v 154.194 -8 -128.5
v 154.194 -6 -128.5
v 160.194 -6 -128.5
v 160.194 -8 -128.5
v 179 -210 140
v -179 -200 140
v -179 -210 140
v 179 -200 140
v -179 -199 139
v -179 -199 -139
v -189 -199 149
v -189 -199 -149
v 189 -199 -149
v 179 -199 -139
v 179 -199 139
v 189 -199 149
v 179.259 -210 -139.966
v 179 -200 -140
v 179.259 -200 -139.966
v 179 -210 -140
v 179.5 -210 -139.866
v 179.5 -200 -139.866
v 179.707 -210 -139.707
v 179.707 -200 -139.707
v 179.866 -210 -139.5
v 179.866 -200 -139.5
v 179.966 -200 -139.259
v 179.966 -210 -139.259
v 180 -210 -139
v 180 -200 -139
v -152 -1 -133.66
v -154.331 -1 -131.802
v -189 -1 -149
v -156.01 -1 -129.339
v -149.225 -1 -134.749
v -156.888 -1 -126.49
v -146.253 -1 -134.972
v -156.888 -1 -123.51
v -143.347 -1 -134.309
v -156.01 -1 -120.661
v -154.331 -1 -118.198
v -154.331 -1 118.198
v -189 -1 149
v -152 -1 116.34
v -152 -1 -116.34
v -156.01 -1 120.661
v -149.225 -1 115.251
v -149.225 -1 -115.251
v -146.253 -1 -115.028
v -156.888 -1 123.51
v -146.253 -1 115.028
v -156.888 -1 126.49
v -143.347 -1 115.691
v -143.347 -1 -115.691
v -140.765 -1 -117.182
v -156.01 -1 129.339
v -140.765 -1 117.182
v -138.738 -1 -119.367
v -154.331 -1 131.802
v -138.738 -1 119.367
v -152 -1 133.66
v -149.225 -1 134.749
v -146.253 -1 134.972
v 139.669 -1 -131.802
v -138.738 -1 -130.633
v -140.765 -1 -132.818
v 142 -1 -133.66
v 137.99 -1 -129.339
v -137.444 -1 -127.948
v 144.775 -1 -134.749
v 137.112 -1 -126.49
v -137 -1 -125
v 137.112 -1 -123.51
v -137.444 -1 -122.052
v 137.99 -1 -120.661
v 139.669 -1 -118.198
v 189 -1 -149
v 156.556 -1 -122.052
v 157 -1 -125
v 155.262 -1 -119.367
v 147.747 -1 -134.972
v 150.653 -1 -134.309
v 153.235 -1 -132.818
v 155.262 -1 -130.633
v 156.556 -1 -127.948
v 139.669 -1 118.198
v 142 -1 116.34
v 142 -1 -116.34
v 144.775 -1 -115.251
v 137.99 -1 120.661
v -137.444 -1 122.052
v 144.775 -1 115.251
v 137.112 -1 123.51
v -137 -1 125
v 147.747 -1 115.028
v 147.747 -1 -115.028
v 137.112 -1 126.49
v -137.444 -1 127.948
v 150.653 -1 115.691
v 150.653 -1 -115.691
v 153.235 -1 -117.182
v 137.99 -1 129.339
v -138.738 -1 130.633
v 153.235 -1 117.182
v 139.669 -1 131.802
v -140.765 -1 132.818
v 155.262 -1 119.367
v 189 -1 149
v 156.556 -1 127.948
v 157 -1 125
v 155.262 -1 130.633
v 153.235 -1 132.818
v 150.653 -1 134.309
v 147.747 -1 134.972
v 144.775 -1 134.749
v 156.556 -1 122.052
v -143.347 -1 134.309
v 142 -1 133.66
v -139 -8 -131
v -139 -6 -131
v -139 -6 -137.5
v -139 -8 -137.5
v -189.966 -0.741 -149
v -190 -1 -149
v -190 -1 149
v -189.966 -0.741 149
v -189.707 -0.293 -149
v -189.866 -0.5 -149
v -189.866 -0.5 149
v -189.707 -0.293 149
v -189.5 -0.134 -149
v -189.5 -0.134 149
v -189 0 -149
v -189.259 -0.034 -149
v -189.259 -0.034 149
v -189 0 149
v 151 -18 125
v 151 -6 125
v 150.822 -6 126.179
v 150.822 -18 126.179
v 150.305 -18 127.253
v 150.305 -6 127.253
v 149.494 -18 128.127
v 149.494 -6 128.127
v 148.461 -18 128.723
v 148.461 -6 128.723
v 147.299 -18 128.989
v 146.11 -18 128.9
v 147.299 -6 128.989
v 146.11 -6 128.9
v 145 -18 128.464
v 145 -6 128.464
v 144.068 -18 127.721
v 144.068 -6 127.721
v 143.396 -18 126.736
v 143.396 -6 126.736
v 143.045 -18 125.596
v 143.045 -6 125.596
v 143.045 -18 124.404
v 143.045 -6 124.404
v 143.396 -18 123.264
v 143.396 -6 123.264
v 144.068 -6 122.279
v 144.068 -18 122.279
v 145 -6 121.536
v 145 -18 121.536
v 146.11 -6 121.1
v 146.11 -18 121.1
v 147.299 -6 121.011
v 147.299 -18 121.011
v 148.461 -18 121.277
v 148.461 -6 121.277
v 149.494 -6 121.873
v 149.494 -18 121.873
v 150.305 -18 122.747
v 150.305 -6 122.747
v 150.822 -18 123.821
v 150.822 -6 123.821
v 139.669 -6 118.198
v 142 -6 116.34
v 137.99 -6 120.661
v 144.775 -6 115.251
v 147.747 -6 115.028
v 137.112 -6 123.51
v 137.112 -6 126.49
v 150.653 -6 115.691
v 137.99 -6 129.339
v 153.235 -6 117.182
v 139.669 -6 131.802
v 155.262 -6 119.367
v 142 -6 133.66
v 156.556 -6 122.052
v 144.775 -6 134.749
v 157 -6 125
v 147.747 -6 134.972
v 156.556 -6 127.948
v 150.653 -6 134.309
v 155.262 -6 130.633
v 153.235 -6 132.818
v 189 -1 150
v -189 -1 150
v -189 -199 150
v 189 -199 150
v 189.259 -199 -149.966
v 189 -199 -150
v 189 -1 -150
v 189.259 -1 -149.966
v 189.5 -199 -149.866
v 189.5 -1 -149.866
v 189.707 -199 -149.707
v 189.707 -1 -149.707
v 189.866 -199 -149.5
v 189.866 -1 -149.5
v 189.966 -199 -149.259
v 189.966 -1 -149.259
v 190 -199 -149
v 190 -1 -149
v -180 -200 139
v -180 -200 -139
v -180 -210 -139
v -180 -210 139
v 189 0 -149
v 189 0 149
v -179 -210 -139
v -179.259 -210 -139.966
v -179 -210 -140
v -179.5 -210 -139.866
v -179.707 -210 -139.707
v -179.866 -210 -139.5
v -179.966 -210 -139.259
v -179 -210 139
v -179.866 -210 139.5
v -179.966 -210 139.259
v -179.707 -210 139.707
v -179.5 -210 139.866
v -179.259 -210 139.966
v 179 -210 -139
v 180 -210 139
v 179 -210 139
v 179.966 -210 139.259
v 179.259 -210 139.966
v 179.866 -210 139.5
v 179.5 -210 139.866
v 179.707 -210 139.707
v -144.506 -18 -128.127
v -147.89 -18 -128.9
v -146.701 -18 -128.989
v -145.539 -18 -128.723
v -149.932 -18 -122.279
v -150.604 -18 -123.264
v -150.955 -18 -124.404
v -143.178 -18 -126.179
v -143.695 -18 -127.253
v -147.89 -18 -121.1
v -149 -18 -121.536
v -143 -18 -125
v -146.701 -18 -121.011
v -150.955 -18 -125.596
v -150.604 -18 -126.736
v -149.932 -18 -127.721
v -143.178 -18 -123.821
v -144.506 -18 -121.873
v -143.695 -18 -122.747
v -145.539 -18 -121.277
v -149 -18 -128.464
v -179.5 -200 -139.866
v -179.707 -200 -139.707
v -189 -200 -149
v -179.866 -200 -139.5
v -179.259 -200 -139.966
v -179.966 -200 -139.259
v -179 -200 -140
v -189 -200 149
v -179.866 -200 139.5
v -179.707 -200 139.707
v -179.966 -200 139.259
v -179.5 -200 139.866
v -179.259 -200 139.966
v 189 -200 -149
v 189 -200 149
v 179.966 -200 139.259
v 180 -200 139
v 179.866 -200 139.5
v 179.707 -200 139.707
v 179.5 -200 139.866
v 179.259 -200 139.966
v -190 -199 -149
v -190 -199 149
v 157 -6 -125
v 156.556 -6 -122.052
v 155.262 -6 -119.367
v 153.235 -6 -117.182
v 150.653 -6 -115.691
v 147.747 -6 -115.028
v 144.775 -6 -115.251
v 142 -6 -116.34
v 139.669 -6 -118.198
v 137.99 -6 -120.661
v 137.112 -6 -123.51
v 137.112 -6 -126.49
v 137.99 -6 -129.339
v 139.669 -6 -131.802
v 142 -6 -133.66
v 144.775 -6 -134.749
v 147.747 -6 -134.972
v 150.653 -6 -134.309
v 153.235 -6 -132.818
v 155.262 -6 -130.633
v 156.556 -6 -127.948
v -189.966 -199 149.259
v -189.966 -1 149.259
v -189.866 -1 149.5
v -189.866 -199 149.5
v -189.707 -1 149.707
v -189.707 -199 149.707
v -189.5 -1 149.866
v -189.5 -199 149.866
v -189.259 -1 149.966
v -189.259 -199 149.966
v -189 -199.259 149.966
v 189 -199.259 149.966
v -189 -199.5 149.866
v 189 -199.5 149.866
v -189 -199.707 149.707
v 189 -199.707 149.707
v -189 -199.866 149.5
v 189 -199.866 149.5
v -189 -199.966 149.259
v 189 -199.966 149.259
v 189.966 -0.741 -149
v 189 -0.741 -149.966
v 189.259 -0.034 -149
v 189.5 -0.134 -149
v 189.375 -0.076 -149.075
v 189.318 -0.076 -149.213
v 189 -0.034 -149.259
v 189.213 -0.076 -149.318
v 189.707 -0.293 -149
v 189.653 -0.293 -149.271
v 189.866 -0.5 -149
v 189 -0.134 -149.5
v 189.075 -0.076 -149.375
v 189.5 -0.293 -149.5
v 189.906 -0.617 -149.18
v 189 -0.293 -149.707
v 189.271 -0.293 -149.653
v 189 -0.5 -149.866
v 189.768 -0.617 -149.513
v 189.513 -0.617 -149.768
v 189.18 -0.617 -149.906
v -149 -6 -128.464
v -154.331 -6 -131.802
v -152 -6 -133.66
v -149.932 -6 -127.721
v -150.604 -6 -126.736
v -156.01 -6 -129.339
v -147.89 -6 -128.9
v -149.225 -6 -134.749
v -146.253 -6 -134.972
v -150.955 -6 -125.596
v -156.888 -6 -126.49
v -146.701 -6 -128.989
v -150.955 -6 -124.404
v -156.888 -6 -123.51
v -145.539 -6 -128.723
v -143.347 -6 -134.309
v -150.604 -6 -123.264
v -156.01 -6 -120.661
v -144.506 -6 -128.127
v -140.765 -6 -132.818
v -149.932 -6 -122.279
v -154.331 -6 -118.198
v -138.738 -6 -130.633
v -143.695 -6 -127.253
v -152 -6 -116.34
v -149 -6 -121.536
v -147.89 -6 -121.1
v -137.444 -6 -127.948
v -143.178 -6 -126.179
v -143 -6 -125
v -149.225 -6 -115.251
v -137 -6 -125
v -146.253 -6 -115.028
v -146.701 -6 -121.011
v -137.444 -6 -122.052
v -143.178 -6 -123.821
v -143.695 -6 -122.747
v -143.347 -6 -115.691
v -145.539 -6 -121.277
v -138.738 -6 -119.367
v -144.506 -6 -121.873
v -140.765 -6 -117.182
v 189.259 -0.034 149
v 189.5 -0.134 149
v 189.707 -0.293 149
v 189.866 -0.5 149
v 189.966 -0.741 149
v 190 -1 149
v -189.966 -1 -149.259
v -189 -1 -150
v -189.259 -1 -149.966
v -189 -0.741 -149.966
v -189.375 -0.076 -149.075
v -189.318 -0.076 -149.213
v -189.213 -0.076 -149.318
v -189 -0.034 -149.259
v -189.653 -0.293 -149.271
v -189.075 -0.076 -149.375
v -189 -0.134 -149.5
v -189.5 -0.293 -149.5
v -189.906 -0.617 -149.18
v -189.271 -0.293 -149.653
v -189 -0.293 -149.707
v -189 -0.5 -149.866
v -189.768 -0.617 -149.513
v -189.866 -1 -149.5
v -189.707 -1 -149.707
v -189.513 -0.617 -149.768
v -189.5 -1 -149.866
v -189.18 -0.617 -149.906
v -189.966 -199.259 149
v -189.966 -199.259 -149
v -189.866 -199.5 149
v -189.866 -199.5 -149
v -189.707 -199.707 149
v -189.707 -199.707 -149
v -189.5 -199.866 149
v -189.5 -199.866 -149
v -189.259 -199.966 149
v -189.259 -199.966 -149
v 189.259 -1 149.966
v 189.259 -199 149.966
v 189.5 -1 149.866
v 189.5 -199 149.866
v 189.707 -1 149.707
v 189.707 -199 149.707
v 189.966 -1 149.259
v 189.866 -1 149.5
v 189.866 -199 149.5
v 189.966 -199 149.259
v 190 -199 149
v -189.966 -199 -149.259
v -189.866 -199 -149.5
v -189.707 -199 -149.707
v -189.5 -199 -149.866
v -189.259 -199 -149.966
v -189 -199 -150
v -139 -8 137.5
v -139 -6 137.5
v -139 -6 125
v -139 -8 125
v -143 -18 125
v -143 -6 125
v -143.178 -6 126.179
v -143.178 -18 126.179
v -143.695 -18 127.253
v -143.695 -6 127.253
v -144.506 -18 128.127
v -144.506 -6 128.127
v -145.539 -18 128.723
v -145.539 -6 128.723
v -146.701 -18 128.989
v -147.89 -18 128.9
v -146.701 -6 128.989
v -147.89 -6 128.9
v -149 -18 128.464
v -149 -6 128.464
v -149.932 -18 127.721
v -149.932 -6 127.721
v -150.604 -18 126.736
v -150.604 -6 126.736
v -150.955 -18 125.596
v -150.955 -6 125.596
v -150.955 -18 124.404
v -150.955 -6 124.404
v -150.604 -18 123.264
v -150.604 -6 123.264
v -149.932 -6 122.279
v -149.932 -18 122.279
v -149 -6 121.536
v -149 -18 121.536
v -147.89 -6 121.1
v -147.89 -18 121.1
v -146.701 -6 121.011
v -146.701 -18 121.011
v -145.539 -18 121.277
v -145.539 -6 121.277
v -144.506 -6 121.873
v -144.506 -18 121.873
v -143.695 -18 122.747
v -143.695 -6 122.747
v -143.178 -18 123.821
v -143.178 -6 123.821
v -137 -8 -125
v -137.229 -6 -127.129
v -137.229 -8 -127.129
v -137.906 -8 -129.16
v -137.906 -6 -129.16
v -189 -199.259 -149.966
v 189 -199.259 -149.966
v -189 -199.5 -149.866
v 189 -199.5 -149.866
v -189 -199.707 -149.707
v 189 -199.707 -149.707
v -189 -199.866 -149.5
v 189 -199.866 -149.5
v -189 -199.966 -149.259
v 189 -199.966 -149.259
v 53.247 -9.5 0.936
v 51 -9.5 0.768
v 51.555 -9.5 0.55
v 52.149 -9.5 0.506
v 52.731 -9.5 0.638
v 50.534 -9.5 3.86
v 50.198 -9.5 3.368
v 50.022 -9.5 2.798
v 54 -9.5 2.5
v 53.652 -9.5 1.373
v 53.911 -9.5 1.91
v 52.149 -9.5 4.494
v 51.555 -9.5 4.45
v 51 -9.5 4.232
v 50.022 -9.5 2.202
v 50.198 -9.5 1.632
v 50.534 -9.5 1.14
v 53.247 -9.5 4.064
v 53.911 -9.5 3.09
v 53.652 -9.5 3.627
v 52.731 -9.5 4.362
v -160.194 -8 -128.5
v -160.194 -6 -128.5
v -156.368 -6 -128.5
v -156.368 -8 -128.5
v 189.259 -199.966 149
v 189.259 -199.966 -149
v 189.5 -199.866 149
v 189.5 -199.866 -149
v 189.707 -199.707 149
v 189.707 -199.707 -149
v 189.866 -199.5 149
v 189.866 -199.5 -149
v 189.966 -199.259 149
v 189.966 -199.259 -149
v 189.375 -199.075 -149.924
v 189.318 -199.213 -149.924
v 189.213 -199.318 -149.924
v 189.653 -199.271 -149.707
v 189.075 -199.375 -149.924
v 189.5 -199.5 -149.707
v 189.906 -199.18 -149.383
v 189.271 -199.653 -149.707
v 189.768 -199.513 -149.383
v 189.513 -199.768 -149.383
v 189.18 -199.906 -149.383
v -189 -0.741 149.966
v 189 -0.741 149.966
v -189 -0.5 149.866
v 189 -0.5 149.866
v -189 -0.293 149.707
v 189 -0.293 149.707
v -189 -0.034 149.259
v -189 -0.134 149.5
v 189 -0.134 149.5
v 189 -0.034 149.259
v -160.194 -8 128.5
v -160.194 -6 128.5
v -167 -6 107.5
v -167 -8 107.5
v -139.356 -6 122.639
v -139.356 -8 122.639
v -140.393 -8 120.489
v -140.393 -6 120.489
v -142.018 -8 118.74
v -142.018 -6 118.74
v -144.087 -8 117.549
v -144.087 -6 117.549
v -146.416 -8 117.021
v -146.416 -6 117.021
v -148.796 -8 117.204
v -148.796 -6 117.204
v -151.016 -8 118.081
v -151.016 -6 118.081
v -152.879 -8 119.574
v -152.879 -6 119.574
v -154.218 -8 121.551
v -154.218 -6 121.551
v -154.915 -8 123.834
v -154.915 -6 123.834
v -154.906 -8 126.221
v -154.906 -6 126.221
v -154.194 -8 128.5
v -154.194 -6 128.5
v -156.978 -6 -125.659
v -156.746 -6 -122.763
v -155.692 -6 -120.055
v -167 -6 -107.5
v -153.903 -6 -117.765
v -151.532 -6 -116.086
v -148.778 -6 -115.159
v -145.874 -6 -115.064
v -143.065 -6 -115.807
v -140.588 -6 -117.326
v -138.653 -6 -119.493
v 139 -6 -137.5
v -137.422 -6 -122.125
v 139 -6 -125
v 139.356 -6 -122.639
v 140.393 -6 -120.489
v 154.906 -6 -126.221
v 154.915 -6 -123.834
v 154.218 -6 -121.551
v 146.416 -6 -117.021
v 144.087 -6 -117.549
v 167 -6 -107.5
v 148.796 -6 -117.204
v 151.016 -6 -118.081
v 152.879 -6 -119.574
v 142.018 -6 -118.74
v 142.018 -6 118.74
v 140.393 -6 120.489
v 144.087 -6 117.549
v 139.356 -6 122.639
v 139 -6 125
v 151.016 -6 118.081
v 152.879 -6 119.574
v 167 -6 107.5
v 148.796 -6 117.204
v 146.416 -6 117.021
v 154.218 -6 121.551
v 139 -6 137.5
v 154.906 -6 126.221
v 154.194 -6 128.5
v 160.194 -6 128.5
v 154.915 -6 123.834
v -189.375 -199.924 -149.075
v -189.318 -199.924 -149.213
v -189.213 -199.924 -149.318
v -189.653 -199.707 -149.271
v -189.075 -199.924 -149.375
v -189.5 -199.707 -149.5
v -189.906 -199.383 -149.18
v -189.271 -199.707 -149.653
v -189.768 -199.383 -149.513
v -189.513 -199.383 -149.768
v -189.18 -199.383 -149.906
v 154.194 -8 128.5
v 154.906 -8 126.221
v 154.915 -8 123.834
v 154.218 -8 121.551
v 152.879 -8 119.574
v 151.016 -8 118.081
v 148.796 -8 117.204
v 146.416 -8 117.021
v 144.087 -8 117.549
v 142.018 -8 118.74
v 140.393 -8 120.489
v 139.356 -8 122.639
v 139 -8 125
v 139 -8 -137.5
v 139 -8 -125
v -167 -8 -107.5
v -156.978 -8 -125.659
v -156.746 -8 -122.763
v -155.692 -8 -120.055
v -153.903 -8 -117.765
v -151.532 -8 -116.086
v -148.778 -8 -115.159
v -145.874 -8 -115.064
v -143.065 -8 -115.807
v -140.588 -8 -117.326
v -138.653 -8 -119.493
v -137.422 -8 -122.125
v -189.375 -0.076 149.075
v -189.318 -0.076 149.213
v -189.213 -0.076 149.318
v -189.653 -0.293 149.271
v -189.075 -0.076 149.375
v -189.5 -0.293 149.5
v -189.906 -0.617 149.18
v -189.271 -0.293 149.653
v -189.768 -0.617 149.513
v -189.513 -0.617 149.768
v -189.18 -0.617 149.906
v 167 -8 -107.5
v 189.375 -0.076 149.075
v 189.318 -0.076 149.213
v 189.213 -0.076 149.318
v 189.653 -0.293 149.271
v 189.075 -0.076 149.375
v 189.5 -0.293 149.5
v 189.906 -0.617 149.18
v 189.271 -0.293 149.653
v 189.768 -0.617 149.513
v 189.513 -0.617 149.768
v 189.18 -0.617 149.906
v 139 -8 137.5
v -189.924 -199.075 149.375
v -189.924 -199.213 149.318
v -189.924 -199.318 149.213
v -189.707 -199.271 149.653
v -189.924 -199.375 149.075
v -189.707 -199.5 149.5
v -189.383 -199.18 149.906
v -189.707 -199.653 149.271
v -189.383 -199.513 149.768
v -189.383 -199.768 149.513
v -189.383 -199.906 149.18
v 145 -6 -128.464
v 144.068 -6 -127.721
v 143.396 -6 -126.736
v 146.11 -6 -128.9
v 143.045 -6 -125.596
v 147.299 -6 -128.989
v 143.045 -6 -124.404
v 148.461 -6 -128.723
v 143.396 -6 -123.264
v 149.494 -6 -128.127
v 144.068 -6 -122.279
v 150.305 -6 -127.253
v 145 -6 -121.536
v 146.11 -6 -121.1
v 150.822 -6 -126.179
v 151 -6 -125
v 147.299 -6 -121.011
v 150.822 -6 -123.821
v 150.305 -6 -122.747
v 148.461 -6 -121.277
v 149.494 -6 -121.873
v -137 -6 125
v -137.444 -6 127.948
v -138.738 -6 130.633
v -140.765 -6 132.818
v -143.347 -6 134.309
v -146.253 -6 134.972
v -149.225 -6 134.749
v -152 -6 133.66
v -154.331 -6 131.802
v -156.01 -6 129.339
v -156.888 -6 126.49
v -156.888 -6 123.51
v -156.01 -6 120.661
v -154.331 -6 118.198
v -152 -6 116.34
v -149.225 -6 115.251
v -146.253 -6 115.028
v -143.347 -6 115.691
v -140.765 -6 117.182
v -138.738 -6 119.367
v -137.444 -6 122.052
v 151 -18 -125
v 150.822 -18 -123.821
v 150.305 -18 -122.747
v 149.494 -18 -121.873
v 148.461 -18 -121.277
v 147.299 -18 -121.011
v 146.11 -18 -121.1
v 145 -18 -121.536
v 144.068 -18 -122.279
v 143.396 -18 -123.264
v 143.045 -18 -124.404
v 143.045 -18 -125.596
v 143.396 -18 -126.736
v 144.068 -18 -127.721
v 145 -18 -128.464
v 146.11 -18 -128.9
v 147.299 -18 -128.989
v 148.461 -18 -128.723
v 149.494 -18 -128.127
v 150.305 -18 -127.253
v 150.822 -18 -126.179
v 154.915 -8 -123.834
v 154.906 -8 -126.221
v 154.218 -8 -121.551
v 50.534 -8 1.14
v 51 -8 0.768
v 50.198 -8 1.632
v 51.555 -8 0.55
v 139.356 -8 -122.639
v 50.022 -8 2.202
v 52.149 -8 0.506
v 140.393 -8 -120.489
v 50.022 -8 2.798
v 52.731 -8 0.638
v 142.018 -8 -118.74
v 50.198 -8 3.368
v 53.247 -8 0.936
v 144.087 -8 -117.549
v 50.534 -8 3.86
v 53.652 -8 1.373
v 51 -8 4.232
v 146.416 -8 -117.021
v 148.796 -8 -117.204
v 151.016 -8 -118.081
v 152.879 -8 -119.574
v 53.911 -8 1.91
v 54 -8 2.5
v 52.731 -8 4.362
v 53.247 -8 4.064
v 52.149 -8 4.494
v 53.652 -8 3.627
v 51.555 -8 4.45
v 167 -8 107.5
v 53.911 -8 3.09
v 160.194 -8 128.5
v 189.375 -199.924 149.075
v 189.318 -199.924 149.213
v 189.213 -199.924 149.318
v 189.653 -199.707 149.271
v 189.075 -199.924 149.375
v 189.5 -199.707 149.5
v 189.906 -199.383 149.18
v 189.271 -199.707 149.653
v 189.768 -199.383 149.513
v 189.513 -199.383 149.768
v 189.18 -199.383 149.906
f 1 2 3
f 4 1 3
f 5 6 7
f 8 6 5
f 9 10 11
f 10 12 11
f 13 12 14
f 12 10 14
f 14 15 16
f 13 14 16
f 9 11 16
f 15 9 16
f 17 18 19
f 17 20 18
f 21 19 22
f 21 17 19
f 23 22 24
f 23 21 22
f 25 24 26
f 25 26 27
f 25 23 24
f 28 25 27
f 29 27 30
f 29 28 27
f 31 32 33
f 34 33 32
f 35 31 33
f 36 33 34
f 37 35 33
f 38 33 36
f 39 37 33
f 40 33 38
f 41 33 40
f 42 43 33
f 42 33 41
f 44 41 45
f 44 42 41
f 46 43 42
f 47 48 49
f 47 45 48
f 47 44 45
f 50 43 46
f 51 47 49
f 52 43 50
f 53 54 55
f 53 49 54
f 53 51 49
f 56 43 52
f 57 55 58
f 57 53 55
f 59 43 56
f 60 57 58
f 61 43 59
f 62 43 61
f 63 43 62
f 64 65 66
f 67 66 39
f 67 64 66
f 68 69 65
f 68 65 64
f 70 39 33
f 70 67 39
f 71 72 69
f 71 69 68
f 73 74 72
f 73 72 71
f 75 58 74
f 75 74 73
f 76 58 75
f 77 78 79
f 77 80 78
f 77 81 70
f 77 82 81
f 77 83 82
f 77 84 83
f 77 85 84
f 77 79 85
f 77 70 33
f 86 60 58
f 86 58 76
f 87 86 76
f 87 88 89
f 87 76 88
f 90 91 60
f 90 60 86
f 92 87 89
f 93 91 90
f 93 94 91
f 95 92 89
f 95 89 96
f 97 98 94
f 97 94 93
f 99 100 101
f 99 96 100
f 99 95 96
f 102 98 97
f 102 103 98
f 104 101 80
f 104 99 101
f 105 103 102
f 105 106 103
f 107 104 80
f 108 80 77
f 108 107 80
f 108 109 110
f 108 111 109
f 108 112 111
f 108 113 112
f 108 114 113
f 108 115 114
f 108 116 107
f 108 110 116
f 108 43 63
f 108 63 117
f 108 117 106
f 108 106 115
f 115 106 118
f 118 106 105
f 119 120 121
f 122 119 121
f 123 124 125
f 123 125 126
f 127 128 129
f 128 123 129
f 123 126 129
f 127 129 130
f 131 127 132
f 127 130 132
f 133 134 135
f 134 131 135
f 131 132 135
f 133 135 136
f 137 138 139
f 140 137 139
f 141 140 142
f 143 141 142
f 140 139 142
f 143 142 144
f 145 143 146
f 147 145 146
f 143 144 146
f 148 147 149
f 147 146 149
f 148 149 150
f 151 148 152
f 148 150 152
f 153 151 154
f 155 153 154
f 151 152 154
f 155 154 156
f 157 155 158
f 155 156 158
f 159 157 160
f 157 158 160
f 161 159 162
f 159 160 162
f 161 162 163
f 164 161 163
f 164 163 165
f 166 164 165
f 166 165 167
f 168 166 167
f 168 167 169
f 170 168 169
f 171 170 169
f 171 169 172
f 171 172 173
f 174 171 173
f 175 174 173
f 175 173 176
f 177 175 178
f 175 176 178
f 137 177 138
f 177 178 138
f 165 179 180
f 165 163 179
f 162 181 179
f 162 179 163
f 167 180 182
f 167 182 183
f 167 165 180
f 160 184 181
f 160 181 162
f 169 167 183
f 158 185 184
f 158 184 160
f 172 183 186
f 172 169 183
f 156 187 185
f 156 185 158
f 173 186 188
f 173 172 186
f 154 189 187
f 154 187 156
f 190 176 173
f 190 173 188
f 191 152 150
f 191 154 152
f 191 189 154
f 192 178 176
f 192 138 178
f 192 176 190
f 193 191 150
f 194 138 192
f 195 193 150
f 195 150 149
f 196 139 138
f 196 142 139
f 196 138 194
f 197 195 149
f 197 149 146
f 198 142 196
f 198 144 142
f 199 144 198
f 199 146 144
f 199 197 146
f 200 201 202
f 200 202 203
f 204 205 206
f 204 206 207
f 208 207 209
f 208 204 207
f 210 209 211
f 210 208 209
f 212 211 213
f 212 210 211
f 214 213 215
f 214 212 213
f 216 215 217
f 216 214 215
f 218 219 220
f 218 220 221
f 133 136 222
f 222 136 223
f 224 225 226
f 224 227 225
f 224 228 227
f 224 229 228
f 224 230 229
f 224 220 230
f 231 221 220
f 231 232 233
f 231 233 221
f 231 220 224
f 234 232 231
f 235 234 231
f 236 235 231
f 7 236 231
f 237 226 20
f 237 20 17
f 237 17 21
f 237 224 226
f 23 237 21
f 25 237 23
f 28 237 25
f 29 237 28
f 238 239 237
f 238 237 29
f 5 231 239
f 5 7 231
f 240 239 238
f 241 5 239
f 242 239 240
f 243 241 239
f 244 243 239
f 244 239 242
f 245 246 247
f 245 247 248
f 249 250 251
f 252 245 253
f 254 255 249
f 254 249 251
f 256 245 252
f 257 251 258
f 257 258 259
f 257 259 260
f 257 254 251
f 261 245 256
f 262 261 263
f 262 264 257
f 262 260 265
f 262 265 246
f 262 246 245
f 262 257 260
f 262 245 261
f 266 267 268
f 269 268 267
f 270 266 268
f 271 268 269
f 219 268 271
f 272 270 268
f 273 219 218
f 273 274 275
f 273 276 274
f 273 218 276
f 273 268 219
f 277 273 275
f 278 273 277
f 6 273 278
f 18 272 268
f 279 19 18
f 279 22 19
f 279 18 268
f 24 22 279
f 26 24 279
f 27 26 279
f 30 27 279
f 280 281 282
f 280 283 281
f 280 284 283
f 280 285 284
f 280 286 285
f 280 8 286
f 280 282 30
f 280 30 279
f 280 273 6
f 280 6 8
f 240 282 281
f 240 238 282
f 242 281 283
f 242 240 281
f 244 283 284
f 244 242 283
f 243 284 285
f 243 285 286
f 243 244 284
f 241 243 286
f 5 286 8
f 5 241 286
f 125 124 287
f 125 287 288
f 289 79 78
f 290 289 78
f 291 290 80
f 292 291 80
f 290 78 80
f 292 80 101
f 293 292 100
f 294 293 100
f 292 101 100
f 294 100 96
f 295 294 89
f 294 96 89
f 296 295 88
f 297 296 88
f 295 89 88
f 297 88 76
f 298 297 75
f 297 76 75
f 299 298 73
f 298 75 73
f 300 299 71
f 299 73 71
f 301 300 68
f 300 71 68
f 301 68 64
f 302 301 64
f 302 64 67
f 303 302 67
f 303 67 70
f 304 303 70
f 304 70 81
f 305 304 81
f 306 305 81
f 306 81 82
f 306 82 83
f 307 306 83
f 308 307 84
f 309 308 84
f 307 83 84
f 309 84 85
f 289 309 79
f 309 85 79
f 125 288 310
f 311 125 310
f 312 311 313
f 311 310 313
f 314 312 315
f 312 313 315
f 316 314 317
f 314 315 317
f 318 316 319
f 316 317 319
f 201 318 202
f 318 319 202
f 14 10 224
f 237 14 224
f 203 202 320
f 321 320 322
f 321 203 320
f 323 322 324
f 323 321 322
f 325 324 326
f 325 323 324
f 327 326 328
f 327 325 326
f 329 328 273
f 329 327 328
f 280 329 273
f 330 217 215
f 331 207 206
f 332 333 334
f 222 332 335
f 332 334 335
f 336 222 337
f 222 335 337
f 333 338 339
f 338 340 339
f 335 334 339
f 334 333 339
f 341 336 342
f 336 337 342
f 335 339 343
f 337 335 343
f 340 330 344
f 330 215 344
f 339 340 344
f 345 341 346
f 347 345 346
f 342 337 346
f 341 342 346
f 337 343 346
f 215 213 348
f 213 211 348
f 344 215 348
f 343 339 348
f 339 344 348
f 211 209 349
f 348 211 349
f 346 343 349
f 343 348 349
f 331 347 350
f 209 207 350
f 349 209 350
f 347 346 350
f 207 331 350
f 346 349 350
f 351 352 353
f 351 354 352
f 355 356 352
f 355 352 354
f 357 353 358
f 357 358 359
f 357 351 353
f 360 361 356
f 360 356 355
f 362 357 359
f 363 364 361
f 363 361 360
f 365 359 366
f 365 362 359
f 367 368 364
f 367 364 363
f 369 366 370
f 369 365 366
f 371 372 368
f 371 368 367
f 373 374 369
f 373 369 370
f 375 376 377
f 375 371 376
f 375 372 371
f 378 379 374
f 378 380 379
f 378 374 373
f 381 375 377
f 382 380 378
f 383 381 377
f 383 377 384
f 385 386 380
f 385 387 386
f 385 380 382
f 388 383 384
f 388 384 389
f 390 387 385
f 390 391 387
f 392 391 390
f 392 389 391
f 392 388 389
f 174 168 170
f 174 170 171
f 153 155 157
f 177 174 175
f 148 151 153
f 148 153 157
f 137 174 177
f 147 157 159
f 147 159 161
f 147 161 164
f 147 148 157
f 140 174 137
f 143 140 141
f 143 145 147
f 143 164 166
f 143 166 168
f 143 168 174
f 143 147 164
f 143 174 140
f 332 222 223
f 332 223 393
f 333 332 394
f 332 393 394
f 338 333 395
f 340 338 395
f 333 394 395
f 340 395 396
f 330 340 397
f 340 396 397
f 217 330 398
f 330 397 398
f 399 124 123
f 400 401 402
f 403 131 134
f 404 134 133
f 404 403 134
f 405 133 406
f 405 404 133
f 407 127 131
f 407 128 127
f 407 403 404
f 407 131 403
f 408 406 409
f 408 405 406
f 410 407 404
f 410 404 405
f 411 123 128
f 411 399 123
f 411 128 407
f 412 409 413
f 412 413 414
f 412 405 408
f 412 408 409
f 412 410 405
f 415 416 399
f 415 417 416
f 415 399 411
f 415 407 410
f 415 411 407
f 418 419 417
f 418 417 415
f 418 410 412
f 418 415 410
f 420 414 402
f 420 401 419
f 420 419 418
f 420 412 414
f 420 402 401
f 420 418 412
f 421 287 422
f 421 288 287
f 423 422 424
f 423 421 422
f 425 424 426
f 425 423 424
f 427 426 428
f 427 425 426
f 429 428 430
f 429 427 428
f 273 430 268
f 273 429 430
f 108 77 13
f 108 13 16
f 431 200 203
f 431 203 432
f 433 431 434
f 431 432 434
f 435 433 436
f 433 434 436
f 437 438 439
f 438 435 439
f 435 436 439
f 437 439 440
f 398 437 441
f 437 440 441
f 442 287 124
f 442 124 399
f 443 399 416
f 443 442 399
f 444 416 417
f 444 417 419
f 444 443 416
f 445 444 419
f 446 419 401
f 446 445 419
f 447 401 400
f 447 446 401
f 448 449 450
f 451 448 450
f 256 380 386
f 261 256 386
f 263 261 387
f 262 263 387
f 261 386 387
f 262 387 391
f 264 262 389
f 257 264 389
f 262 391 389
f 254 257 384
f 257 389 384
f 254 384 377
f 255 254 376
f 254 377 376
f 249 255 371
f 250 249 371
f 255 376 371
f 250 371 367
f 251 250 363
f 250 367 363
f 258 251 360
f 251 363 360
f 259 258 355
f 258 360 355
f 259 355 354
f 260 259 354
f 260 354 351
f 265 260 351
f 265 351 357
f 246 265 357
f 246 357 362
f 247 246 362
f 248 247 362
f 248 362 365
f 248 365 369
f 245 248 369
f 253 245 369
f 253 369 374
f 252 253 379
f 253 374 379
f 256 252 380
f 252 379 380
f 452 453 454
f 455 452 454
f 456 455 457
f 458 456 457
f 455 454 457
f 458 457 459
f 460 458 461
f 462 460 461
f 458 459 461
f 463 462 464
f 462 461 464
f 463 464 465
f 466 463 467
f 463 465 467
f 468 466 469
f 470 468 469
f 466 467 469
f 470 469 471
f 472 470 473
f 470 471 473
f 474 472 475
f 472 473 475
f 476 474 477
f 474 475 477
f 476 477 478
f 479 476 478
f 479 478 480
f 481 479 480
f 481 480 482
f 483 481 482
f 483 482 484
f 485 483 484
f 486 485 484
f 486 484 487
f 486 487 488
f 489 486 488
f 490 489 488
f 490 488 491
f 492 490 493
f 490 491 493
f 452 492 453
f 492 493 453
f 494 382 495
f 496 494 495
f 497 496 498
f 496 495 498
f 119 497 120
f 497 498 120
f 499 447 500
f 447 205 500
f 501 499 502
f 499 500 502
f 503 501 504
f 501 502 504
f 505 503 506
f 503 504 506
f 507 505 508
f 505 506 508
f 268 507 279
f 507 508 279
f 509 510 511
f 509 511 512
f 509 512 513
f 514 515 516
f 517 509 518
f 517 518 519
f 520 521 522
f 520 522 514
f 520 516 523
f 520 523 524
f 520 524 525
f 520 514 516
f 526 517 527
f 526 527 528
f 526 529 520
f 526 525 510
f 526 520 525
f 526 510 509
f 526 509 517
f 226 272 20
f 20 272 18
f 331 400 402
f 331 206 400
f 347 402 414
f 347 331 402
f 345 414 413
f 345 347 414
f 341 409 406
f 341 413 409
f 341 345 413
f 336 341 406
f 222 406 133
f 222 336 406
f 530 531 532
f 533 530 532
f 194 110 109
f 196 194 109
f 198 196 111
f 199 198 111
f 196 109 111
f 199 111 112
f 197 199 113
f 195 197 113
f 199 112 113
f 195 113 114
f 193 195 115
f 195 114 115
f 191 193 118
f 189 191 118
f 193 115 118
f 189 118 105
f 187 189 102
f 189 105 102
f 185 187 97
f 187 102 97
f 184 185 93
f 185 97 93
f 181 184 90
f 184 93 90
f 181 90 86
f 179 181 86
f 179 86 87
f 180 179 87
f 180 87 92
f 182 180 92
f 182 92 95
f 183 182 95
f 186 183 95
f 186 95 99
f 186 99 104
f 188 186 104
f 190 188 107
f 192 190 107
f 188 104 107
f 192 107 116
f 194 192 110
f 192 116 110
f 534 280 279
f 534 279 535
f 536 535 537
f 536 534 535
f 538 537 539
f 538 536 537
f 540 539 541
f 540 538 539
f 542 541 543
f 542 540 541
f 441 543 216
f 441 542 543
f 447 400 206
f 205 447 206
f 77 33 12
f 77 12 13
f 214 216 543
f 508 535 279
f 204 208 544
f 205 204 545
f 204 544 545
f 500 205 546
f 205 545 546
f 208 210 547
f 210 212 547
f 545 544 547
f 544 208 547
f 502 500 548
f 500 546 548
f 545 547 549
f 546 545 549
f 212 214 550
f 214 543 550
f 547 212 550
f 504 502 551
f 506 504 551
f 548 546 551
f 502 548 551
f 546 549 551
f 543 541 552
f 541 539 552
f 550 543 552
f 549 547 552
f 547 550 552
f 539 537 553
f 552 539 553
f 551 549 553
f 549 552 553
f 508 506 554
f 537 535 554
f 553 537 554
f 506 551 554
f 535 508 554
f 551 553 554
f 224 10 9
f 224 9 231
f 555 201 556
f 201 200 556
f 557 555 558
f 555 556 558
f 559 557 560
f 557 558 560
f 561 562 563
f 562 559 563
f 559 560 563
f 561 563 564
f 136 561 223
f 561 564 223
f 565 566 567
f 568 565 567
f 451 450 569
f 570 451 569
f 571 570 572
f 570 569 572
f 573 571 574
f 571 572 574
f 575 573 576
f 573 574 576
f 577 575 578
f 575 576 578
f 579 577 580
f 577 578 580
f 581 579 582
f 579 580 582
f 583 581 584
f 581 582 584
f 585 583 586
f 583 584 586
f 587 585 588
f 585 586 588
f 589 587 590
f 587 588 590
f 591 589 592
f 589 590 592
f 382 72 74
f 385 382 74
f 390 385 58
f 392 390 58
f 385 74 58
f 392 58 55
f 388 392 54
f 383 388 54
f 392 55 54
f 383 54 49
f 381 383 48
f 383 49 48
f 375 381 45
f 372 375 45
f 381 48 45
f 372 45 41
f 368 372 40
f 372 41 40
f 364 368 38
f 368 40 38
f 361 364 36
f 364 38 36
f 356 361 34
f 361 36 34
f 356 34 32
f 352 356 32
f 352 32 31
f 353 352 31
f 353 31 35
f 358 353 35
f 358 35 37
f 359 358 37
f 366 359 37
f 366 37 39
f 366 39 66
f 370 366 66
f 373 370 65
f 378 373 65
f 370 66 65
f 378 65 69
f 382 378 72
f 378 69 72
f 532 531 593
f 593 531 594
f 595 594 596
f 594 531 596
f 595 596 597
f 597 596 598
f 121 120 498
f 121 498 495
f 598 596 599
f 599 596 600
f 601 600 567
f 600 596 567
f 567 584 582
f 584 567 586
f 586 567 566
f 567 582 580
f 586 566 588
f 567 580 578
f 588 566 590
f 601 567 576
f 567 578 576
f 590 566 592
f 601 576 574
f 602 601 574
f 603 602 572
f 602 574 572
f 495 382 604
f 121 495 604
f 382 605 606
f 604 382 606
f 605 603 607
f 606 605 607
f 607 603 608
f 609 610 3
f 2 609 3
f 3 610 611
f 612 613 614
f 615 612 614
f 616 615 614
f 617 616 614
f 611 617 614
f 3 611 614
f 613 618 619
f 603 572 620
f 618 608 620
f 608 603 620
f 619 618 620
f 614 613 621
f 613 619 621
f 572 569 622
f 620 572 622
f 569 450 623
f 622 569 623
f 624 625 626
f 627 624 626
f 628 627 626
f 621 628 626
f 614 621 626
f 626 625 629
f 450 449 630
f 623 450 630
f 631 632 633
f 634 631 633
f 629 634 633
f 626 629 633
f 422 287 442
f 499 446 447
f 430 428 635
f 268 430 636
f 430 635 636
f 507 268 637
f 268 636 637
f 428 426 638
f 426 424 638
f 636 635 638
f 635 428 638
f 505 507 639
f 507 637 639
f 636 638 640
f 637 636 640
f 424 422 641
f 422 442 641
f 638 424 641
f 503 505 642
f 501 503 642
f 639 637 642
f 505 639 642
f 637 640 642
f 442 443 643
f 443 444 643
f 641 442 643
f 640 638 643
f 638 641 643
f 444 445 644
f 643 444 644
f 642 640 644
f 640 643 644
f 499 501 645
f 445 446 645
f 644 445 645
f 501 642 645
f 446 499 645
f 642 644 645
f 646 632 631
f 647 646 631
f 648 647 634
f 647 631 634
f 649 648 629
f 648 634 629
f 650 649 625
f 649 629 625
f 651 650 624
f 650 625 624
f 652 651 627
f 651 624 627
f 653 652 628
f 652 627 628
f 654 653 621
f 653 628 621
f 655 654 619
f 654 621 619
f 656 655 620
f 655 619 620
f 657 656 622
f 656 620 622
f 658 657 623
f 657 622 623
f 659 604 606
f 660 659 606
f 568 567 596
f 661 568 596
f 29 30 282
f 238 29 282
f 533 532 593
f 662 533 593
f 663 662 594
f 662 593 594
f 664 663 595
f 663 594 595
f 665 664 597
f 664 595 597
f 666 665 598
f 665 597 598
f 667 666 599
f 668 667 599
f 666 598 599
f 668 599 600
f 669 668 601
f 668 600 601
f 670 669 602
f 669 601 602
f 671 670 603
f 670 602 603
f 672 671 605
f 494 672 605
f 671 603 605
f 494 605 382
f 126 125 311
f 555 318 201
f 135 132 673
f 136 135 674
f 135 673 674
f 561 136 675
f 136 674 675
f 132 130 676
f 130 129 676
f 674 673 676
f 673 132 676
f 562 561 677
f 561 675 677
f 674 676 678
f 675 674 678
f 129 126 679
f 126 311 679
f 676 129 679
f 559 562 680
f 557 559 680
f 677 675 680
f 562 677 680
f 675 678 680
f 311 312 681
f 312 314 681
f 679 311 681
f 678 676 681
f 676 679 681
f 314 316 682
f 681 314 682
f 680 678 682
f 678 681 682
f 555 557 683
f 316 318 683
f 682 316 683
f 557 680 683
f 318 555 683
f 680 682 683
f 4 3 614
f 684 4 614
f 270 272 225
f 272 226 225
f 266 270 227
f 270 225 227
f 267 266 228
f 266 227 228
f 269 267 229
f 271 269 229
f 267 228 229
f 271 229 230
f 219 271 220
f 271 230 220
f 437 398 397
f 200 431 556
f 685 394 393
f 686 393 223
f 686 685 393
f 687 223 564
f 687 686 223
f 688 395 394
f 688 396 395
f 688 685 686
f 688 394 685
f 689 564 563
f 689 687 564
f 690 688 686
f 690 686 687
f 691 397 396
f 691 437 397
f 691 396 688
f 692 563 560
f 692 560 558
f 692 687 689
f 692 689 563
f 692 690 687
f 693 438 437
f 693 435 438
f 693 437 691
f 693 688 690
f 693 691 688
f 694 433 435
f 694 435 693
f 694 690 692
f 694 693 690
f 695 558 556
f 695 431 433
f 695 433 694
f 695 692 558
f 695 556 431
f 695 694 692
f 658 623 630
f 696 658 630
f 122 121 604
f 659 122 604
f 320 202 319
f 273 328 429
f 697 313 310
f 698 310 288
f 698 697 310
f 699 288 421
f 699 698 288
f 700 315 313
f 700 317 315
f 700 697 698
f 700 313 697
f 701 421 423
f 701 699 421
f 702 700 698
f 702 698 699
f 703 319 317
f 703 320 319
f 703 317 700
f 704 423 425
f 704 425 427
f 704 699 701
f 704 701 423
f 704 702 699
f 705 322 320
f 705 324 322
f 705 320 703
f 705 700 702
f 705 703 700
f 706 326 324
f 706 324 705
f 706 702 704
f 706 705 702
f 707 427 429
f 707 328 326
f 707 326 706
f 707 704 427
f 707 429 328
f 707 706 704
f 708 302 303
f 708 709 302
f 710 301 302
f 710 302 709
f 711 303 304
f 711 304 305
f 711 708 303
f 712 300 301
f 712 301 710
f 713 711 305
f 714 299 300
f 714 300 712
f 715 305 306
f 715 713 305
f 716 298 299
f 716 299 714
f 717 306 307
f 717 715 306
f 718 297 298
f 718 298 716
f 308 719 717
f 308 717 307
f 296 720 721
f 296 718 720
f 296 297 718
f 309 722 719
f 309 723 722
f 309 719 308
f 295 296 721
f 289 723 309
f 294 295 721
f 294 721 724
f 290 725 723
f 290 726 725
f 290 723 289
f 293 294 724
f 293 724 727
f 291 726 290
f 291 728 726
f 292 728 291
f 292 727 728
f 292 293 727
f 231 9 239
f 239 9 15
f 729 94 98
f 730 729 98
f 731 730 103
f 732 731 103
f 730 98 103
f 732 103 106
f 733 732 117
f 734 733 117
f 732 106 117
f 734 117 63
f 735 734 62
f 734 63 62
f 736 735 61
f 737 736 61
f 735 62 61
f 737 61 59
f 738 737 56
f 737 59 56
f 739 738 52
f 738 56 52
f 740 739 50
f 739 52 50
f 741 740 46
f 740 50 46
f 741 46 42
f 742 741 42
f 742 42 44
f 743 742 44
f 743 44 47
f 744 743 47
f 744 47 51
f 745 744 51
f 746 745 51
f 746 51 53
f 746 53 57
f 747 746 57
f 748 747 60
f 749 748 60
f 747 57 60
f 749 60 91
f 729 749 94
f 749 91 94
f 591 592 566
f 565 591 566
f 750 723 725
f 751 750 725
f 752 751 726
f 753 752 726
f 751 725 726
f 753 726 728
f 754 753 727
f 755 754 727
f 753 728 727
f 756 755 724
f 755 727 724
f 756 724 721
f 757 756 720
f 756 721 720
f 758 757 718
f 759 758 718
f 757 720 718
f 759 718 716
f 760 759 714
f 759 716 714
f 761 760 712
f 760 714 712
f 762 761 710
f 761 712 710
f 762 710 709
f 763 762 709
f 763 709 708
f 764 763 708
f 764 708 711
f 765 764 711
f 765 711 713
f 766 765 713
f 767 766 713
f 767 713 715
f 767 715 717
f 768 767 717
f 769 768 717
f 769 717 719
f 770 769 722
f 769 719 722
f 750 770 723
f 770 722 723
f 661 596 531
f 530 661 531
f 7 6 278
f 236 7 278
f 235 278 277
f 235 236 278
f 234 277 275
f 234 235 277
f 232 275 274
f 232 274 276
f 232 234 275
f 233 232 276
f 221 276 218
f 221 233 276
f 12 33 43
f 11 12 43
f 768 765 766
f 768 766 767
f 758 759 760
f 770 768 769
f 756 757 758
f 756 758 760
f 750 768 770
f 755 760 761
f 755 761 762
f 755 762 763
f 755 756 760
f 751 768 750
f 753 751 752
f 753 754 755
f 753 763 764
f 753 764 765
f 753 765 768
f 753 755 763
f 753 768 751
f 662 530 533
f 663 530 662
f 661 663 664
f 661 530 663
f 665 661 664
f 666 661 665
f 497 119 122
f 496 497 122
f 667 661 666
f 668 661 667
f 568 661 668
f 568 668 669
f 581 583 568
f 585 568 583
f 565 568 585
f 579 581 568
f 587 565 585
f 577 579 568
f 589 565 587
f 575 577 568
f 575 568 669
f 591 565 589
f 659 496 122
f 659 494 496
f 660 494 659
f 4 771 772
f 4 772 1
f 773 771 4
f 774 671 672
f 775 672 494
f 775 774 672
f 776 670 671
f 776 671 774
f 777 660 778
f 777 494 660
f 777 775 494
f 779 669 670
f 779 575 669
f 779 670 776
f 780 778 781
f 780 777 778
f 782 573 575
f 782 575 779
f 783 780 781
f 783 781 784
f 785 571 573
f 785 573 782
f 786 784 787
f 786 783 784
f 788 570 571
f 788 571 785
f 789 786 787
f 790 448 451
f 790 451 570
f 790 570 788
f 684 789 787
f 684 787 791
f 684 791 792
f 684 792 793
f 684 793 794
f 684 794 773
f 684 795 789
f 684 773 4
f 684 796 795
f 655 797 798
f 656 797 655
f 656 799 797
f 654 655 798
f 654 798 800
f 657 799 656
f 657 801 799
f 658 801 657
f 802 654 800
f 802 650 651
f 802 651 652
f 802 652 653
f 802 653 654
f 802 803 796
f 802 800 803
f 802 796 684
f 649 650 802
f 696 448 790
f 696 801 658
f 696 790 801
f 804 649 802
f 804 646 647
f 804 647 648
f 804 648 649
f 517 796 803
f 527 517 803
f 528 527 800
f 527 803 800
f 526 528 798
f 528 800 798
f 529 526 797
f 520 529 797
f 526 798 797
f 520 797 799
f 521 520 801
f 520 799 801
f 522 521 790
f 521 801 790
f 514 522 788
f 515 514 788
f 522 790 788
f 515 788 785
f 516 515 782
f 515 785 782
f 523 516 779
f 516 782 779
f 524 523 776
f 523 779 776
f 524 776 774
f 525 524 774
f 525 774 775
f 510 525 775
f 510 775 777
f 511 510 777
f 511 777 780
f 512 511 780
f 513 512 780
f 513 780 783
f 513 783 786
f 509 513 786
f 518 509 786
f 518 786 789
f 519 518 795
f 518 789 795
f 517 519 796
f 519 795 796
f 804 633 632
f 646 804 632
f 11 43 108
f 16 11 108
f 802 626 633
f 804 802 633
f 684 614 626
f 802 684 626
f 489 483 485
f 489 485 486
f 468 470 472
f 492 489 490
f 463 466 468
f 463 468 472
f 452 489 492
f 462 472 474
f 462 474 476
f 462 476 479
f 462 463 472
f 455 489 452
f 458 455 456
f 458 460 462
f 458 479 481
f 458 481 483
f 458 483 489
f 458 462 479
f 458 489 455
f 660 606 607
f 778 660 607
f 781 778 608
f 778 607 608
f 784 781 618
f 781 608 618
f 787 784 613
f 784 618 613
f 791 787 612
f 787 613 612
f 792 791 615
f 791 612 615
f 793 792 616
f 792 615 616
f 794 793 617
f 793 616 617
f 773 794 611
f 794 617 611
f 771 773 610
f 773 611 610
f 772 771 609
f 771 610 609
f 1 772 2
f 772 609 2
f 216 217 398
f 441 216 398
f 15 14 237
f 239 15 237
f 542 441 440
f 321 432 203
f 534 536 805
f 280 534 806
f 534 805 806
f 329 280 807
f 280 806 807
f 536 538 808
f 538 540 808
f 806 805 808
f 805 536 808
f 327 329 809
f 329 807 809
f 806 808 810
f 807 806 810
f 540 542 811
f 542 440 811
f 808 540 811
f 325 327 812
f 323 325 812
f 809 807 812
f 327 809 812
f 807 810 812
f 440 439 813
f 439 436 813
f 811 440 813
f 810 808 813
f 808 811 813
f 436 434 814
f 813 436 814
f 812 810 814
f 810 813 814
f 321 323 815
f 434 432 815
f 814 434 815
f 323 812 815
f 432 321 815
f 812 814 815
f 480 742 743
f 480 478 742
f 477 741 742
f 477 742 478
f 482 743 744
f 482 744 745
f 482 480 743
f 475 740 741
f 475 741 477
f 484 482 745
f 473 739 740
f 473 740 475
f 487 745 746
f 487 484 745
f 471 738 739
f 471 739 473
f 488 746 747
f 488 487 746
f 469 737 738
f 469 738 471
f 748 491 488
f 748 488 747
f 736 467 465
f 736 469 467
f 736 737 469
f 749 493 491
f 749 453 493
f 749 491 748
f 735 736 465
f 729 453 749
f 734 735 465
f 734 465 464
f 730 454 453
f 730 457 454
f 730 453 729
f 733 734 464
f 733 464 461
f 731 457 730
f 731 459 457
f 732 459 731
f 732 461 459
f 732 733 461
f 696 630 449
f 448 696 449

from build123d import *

# Parameters (mm, degrees)
F0_W         = 380
F0_H         = 300
F1_DEPTH     = 200
F2_W         = 360
F2_H         = 280
F3_DEPTH     = 10
F4_R         = 1
F5_T         = 1
F5_T3_DEPTH  = 280
F5_T5_DEPTH  = 360
F5_T8_ANGLE  = 90.000000001
F5_T10_ANGLE = 90.000000001
F5_T12_ANGLE = 90.000000001
F5_T14_ANGLE = 90.000000001
F6_R         = 10
F6_R_2       = 4
F7_DEPTH     = 5
F8_R         = 4
F9_DEPTH     = 12
F11_DEPTH    = 2
F12_R        = 2
F13_DEPTH    = 1.5


# Not quite as in the source:
# - a shell that OpenCascade refuses in one call is made with other operations: the cavity is built on its own and cut out


with BuildPart() as f1:
    # F0 (on Front) → F1 (new body)
    with BuildSketch(Plane.XZ):
        Rectangle(F0_W, F0_H)
    extrude(amount=F1_DEPTH)

    # F2 (on face) → F3 (join)
    with BuildSketch(Plane.XZ.offset(200)):
        Rectangle(F2_W, F2_H)
    extrude(amount=F3_DEPTH)

    # F4
    f4_edges = [f1.edges().sort_by_distance(p)[0] for p in [
        (190, -100, 150),
        (190, -200, 0),
        (190, -100, -150),
        (190, 0, 0),
        (0, -200, 150),
        (-190, -100, 150),
        (-190, -100, -150),
        (-190, -200, 0),
        (-190, 0, 0),
        (0, 0, 150),
        (0, -200, -150),
        (0, 0, -150),
        (180, -205, 140),
        (-180, -205, 140),
        (180, -205, -140),
        (-180, -205, -140),
    ]]
    fillet(f4_edges, radius=F4_R)

    # F5: shell of thickness 1, made by hand


with BuildPart() as f5_core1:
    # F5_t2: copy of F1
    add(f1.part)

    # the walls: a layer under each face that stays
    f5_faces = [f5_core1.faces().sort_by_distance(p)[0] for p in [
        (190, -100, 0),
        (0, -100, 150),
        (0, 0, 0),
        (129.9375, -200, -145.3209876543),
        (0, -100, -150),
        (180, -205, 0),
        (0, -205, -140),
        (0, -205, 140),
        (-180, -205, 0),
        (-190, -100, 0),
    ]]
    thicken(f5_faces, amount=-F5_T, mode=Mode.SUBTRACT)

    # F5_s4 → F5_t3 (cut)
    with BuildSketch(Plane.XY.offset(-140)):
        Polygon((180.01, -200.01), (180, -199), (179, -199), (179, -200), align=None)
        Polygon((-180.01, -200.01), (-180, -199), (-179, -199), (-179, -200), align=None)
    extrude(amount=F5_T3_DEPTH, mode=Mode.SUBTRACT)

    # F5_s6 → F5_t5 (cut)
    with BuildSketch(Plane.YZ.offset(-180)):
        Polygon((-200.01, -140.01), (-199, -140), (-199, -139), (-200, -139), align=None)
        Polygon((-200.01, 140.01), (-199, 140), (-199, 139), (-200, 139), align=None)
    extrude(amount=F5_T5_DEPTH, mode=Mode.SUBTRACT)

    # F5_s7 → F5_t8 (revolve, cut)
    with BuildSketch(Plane.XY.offset(-139)):
        Polygon((180.01, -200.01), (180, -199), (179, -199), (179, -200), align=None)
    revolve(axis=Axis((179, -200, -139), (0, 1, 0)), revolution_arc=F5_T8_ANGLE, mode=Mode.SUBTRACT)

    # F5_s9 → F5_t10 (revolve, cut)
    with BuildSketch(Plane.XY.offset(139)):
        Polygon((180.01, -200.01), (180, -199), (179, -199), (179, -200), align=None)
    revolve(axis=Axis((179, -200, 139), (0, -1, 0)), revolution_arc=F5_T10_ANGLE, mode=Mode.SUBTRACT)

    # F5_s11 → F5_t12 (revolve, cut)
    with BuildSketch(Plane.XY.offset(-139)):
        Polygon((-180.01, -200.01), (-180, -199), (-179, -199), (-179, -200), align=None)
    revolve(axis=Axis((-179, -200, -139), (0, -1, 0)), revolution_arc=F5_T12_ANGLE, mode=Mode.SUBTRACT)

    # F5_s13 → F5_t14 (revolve, cut)
    with BuildSketch(Plane.YZ.offset(-179)):
        Polygon((-200.01, 140.01), (-199, 140), (-199, 139), (-200, 139), align=None)
    revolve(axis=Axis((-179, -200, 139), (0, -1, 0)), revolution_arc=F5_T14_ANGLE, mode=Mode.SUBTRACT)


with BuildPart() as f1_1:
    add(f1.part)

    # what is left inside the walls is the cavity
    f5_cavity = [f5_core1.part.solids().sort_by_distance(p)[0] for p in [
        (0, -1.01, -49.666667),
    ]]
    add(f5_cavity, mode=Mode.SUBTRACT)

    # F6 (on face) → F7 (join)
    with BuildSketch(Plane.XZ.offset(1)):
        with Locations((-147, -125)):
            Circle(F6_R)
        with Locations((-147, -125)):
            Circle(F6_R_2, mode=Mode.SUBTRACT)
        with Locations((-147, -125)):
            Circle(F6_R_2)
        with Locations((147, 125)):
            Circle(F6_R)
        with Locations((147, 125)):
            Circle(F6_R_2, mode=Mode.SUBTRACT)
        with Locations((147, 125)):
            Circle(F6_R_2)
        with Locations((-147, 125)):
            Circle(F6_R)
        with Locations((-147, 125)):
            Circle(F6_R_2, mode=Mode.SUBTRACT)
        with Locations((-147, 125)):
            Circle(F6_R_2)
        with Locations((147, -125)):
            Circle(F6_R)
        with Locations((147, -125)):
            Circle(F6_R_2, mode=Mode.SUBTRACT)
        with Locations((147, -125)):
            Circle(F6_R_2)
    extrude(amount=F7_DEPTH)

    # F8 (on face) → F9 (join)
    with BuildSketch(Plane.XZ.offset(6)):
        with Locations((-147, 125)):
            Circle(F8_R)
        with Locations((147, 125)):
            Circle(F8_R)
        with Locations((-147, -125)):
            Circle(F8_R)
        with Locations((147, -125)):
            Circle(F8_R)
    extrude(amount=F9_DEPTH)


with BuildPart() as f11:
    # F10 (on face) → F11 (new body)
    with BuildSketch(Plane.XZ.offset(6)):
        with BuildLine():
            Line((139, 125), (139, 137.5))
            Line((139, 137.5), (-139, 137.5))
            Line((-139, 137.5), (-139, 125))
            ThreePointArc((-139, 125), (-148.7958315233, 117.2041684767), (-154.193747285, 128.5))
            Line((-154.193747285, 128.5), (-160.193747285, 128.5))
            Line((-160.193747285, 128.5), (-167, 107.5))
            Line((-167, 107.5), (-167, -107.5))
            Line((-167, -107.5), (-160.1938831182, -128.4995809004))
            Line((-160.1938831182, -128.4995809004), (-156.3676202463, -128.4996701162))
            ThreePointArc((-156.3676202463, -128.4996701162), (-148.7781728737, -115.1593647953), (-137, -125))
            ThreePointArc((-137, -125), (-137.5131670195, -128.1622776602), (-139, -131))
            Line((-139, -131), (-139, -137.5))
            Line((-139, -137.5), (-137, -137.5))
            Line((-137, -137.5), (139, -137.5))
            Line((139, -137.5), (139, -125))
            ThreePointArc((139, -125), (148.7958315233, -117.2041684767), (154.193747285, -128.5))
            Line((154.193747285, -128.5), (160.193747285, -128.5))
            Line((160.193747285, -128.5), (167, -107.5))
            Line((167, -107.5), (167, 107.5))
            Line((167, 107.5), (160.193747285, 128.5))
            Line((160.193747285, 128.5), (154.193747285, 128.5))
            ThreePointArc((154.193747285, 128.5), (148.7958315233, 117.2041684767), (139, 125))
        make_face()
    extrude(amount=F11_DEPTH)

    # F12 (on face) → F13 (join)
    with BuildSketch(Plane.XZ.offset(8)):
        with Locations((52, 2.5)):
            Circle(F12_R)
    extrude(amount=F13_DEPTH)


solid = Compound([f1_1.part, f11.part])
